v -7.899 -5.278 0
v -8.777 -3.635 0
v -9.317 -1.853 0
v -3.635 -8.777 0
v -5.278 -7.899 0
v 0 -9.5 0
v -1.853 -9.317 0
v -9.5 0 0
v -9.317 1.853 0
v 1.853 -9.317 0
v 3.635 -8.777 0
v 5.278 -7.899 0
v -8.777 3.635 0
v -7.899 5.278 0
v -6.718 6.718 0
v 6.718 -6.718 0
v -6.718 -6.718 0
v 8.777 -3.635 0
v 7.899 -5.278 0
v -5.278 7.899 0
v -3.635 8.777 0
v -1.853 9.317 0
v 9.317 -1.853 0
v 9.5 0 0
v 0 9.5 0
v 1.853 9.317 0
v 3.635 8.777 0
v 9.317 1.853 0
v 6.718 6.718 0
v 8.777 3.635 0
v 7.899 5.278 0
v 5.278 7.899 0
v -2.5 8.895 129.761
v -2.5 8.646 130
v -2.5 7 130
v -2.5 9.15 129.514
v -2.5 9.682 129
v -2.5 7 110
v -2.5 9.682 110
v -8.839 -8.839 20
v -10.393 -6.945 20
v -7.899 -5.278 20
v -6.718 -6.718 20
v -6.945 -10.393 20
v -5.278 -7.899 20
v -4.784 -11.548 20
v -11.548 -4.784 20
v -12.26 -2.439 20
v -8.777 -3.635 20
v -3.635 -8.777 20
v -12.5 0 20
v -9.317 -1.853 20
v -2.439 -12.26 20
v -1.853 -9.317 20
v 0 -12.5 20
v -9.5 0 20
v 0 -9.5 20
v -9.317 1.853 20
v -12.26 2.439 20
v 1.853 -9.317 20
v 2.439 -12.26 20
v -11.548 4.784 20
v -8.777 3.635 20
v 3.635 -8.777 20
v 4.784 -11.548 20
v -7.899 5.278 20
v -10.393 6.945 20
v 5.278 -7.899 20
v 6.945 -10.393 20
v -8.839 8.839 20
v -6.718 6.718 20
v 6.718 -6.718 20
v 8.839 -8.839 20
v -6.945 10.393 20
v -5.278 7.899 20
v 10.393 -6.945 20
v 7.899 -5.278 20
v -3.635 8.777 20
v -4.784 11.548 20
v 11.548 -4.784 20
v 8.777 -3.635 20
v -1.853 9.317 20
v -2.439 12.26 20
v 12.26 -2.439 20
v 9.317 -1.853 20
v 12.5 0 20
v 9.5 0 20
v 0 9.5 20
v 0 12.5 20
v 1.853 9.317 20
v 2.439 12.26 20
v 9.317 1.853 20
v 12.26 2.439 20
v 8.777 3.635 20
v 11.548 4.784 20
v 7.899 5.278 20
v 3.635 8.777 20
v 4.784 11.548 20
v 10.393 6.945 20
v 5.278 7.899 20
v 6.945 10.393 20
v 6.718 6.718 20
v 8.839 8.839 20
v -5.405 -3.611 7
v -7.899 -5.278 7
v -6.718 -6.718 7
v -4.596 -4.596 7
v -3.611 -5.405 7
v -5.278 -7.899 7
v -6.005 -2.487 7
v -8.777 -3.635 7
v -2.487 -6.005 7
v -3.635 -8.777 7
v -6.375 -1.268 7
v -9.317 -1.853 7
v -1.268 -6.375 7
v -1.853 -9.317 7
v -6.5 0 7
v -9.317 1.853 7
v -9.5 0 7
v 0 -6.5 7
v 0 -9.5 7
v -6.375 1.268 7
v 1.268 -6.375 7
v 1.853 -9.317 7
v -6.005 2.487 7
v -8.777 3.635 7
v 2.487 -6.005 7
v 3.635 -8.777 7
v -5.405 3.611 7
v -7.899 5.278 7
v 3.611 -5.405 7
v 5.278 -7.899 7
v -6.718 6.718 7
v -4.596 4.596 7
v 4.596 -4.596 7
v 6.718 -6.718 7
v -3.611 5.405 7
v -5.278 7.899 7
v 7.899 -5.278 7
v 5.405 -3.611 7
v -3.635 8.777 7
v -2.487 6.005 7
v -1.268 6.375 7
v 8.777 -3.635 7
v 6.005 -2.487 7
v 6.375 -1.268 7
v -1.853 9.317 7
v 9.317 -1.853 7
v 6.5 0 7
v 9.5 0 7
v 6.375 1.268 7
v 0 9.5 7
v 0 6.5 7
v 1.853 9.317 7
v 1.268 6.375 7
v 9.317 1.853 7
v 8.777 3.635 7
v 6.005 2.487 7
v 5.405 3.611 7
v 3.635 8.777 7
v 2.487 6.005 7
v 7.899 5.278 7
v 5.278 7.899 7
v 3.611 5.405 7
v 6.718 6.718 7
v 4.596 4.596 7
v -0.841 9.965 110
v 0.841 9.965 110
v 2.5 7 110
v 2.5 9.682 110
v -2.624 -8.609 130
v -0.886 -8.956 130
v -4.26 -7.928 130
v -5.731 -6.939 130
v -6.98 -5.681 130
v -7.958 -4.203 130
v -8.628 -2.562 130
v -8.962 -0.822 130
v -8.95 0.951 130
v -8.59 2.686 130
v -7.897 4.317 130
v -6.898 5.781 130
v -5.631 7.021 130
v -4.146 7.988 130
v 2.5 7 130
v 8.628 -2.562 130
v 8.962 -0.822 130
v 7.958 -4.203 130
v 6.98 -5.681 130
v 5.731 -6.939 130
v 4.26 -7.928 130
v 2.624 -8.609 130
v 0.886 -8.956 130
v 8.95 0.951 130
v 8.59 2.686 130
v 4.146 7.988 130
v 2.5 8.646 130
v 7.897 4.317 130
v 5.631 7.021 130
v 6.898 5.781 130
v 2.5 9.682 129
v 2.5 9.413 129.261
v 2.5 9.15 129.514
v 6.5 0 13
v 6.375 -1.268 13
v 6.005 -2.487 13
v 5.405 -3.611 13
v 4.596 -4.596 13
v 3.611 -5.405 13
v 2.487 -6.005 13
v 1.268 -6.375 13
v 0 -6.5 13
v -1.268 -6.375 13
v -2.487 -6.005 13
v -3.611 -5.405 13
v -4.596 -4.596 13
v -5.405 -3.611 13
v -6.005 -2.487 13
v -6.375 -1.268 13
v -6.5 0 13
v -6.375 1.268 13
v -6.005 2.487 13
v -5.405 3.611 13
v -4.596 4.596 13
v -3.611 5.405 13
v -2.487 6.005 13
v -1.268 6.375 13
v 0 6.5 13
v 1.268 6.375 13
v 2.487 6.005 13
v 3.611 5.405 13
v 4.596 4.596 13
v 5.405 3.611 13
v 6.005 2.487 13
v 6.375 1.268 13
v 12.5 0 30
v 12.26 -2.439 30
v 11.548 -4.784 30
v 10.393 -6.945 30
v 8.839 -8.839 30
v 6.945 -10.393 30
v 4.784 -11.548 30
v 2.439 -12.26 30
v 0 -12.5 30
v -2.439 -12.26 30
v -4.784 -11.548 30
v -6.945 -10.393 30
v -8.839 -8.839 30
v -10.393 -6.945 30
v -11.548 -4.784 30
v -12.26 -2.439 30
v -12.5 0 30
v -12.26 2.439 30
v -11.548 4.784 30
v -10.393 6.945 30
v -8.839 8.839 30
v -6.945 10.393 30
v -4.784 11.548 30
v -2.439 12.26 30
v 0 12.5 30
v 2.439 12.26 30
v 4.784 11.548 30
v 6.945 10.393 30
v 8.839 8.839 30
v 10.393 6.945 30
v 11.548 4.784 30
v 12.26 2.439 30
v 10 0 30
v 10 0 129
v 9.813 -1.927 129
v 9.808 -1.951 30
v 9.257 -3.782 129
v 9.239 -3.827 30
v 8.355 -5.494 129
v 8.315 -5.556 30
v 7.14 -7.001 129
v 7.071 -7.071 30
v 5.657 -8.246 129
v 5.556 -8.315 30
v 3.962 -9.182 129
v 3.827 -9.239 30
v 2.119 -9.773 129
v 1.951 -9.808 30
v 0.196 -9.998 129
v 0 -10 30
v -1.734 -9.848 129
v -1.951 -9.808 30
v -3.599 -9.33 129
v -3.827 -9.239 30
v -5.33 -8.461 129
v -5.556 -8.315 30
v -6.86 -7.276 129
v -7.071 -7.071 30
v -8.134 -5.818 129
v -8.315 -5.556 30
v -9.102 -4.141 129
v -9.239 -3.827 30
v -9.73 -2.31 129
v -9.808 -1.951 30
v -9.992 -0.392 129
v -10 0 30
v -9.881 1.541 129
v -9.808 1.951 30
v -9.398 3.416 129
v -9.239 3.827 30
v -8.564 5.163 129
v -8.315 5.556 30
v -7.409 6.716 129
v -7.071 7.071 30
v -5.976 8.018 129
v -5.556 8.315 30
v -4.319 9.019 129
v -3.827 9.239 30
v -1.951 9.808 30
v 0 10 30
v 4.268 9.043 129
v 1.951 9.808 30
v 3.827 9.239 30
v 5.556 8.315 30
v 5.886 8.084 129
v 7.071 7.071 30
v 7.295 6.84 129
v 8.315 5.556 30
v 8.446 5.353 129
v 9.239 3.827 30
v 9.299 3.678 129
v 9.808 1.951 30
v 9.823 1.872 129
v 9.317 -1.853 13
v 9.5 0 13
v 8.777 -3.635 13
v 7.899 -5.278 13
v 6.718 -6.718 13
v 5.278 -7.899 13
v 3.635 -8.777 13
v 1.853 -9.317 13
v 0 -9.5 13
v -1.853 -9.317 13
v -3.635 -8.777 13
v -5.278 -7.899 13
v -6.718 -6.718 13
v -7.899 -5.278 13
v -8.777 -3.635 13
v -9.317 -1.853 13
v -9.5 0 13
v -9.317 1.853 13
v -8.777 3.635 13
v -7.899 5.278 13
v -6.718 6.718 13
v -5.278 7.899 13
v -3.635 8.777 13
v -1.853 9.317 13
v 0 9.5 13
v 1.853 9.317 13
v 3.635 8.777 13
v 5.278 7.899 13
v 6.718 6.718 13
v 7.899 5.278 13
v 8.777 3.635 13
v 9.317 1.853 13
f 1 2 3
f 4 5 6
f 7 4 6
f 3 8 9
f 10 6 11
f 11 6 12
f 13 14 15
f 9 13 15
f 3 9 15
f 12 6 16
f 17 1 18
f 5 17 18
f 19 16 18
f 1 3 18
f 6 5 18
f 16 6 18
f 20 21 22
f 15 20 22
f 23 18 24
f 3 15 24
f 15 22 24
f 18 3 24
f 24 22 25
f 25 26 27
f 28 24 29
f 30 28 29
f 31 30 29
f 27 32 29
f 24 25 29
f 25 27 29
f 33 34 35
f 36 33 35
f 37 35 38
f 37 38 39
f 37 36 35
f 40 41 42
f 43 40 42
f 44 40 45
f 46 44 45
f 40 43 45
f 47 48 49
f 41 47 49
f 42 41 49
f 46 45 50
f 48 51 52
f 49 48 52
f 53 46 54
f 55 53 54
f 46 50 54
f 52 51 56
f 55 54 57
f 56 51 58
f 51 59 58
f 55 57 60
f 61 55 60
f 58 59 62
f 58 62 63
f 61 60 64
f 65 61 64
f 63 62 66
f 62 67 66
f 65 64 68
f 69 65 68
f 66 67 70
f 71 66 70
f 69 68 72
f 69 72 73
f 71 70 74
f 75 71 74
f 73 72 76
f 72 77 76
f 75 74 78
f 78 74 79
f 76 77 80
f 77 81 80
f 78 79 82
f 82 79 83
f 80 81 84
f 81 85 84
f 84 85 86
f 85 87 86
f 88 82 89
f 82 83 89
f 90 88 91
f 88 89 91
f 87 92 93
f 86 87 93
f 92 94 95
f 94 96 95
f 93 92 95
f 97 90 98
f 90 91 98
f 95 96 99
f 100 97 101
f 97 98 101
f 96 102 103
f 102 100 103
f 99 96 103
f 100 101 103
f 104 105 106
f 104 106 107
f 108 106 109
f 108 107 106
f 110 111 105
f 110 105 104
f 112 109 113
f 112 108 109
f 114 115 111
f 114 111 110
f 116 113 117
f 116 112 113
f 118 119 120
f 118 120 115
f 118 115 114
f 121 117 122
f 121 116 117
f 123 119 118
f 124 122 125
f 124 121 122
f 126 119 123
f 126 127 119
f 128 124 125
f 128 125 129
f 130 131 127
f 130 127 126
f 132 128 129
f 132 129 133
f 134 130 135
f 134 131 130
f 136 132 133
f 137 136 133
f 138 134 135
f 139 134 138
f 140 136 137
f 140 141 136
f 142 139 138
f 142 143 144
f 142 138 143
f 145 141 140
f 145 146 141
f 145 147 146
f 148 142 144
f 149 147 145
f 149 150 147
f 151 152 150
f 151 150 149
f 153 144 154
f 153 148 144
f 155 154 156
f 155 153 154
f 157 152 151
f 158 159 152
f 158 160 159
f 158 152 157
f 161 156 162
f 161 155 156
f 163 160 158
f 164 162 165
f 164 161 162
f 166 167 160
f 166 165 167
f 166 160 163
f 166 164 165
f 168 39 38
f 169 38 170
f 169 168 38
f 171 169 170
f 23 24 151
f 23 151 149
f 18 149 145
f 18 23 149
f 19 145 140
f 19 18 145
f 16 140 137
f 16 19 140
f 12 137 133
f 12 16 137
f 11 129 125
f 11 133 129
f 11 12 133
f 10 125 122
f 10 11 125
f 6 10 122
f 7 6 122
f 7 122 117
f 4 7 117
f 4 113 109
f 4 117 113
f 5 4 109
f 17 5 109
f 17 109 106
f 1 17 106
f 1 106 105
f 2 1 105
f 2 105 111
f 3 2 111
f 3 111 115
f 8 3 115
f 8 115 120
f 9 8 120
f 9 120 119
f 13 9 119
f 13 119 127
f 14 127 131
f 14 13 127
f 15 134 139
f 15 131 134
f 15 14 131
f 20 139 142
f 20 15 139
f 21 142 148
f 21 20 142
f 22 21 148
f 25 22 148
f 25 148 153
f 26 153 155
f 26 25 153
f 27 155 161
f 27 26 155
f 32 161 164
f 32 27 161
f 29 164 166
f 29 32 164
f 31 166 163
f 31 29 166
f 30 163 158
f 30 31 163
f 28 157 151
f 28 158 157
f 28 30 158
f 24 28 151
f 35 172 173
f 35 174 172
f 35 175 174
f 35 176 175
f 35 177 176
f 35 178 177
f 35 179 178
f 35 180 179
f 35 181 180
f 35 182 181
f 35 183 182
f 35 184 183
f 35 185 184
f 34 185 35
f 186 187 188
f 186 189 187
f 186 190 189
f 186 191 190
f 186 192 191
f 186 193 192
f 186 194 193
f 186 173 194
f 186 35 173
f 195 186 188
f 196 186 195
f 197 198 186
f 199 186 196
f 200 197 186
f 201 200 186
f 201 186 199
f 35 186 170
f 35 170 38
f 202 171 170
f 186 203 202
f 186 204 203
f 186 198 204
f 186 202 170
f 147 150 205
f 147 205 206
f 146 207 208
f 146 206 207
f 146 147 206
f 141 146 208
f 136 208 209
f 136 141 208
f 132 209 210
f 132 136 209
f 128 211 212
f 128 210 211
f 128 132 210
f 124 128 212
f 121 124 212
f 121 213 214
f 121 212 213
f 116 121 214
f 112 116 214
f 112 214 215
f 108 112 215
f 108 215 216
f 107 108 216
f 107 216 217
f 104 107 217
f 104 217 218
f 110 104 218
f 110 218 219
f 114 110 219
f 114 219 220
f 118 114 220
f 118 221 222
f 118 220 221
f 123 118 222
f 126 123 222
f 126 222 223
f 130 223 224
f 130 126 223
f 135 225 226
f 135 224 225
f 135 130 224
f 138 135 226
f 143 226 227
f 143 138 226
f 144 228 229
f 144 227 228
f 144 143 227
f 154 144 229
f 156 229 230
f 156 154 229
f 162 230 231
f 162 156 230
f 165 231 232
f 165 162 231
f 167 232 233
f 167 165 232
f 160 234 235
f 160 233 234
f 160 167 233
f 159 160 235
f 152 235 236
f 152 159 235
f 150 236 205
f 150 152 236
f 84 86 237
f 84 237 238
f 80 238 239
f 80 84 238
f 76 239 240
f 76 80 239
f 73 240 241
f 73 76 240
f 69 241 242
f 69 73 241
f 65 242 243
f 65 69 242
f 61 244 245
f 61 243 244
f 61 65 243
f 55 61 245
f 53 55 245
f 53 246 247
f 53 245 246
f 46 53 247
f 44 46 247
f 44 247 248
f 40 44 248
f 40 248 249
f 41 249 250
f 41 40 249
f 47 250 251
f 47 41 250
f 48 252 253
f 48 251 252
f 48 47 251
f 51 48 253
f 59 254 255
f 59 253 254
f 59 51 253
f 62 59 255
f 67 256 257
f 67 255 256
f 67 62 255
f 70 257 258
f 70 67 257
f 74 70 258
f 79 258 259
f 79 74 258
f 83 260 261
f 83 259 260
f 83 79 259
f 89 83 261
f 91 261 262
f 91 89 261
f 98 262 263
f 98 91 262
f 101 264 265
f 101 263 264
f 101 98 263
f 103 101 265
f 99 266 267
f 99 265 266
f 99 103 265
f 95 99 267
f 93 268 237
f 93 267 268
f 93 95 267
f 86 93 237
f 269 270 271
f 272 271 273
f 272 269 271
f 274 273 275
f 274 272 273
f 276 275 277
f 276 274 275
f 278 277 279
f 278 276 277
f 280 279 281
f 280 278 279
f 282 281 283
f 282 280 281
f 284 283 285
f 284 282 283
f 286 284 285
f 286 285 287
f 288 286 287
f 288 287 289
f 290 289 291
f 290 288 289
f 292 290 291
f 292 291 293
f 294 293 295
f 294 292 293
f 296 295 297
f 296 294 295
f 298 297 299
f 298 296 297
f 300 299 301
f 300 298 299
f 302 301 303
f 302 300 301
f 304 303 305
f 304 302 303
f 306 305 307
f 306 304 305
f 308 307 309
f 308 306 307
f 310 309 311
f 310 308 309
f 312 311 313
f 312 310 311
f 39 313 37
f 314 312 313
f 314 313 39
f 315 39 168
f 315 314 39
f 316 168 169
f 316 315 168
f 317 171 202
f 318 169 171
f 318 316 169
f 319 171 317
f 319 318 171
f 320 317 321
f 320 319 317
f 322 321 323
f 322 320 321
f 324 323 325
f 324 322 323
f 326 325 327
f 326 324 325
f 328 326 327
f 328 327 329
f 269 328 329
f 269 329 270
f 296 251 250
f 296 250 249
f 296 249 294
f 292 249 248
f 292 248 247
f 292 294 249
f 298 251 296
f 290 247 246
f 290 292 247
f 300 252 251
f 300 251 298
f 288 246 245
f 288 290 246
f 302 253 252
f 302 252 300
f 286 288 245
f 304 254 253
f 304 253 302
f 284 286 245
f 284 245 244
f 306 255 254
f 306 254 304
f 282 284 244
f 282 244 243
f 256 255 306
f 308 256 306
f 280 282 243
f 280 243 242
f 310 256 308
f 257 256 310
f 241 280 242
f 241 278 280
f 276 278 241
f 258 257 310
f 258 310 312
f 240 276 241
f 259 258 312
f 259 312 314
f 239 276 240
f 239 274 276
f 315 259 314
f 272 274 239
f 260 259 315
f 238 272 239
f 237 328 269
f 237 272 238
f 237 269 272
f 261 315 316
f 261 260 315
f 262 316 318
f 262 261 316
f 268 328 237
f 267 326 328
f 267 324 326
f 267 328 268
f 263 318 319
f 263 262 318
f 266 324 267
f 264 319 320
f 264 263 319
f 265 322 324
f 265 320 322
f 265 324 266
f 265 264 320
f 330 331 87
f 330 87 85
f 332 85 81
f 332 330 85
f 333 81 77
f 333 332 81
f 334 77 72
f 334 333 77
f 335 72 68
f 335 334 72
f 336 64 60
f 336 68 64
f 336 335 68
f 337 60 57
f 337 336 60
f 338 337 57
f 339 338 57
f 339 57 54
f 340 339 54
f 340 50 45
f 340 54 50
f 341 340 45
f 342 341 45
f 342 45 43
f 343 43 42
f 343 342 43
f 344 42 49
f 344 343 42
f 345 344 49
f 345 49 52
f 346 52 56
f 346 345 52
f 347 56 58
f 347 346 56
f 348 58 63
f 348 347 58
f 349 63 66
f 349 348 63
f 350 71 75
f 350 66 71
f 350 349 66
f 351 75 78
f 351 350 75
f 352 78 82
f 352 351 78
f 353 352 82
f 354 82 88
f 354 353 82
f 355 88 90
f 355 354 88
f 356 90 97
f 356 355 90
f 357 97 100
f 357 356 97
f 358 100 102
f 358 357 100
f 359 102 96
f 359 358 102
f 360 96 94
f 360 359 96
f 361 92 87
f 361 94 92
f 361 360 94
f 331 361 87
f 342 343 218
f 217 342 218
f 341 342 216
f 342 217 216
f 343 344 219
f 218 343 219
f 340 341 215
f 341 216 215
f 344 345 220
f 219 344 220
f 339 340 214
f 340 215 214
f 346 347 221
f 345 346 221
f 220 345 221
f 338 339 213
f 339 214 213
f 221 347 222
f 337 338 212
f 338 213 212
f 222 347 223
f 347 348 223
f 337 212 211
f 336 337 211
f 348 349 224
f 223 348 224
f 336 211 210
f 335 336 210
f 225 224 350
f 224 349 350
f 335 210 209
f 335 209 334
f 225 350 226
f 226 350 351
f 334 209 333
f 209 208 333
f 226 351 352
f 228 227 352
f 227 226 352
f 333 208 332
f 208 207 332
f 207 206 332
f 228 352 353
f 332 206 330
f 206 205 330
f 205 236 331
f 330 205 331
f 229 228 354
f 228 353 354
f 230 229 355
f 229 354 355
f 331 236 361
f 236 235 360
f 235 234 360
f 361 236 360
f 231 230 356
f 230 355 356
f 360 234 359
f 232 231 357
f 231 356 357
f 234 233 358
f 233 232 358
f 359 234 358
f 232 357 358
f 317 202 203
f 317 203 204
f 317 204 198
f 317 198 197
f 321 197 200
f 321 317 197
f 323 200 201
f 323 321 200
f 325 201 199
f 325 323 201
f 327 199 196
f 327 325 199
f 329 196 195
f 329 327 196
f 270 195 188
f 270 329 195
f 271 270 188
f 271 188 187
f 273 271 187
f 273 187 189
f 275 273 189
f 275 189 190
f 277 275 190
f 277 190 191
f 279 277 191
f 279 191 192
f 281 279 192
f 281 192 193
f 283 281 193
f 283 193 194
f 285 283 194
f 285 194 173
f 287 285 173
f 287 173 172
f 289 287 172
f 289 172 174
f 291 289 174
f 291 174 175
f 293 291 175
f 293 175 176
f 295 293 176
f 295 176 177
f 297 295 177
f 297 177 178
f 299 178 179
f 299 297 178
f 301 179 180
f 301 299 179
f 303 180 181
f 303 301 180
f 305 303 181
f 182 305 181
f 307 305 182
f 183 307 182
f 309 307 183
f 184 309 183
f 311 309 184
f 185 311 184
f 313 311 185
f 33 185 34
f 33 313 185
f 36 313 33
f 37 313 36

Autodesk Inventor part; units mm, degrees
ref_plane "YZ Plane" through (0, 0, 0) normal (1, 0, 0) x (0, 1, 0)
ref_plane "XZ Plane" through (0, 0, 0) normal (0, 1, 0) x (-1, 0, 0)
ref_plane "XY Plane" through (0, 0, 0) normal (0, 0, 1) x (1, 0, 0)
sketch "Sketch1" plane through (0, 0, 0) normal (0, 0, 1) x (1, 0, 0)
  circle A0 centre (0, 0) radius 9.5
  dimension "d0" = 19
extrude "Extrusion1" add sketch "Sketch1" along normal blind 7
sketch "Sketch2" plane through (0, 0, 7) normal (0, 0, 1) x (1, 0, 0)
  circle A0 centre (0, 0) radius 6.5
  dimension "d3" = 13
extrude "Extrusion2" add sketch "Sketch2" along normal blind 6
sketch "Sketch3" plane through (0, 0, 13) normal (0, 0, 1) x (1, 0, 0)
  circle A0 centre (0, 0) radius 9.5
  dimension "d6" = 19
extrude "Extrusion3" add sketch "Sketch3" along normal blind 7
sketch "Sketch4" plane through (0, 0, 20) normal (0, 0, 1) x (1, 0, 0)
  circle A0 centre (0, 0) radius 12.5
  dimension "d9" = 25
extrude "Extrusion4" add sketch "Sketch4" along normal blind 10
sketch "Sketch5" plane through (0, 0, 30) normal (0, 0, 1) x (1, 0, 0)
  circle A0 centre (0, 0) radius 10
  dimension "d12" = 20
extrude "Extrusion5" add sketch "Sketch5" along normal blind 100
chamfer "Chamfer1" distance 1 angle 45 1 edges at (-10, 0, 130)
sketch "Sketch6" plane through (0, 0, 130) normal (0, 0, 1) x (1, 0, 0)
  line L0 (-2.5, 12) -> (2.5, 12)
  line L1 (2.5, 12) -> (2.5, 7)
  line L2 (2.5, 7) -> (-2.5, 7)
  line L3 (-2.5, 7) -> (-2.5, 12)
  point P0 (0, 0)
  point P1 (0, 7)
  dimension "d18" = 5
  dimension "d19" = 5
  dimension "d20" = 7
extrude "Extrusion6" cut sketch "Sketch6" against normal blind 20
properties part number "shaft"
